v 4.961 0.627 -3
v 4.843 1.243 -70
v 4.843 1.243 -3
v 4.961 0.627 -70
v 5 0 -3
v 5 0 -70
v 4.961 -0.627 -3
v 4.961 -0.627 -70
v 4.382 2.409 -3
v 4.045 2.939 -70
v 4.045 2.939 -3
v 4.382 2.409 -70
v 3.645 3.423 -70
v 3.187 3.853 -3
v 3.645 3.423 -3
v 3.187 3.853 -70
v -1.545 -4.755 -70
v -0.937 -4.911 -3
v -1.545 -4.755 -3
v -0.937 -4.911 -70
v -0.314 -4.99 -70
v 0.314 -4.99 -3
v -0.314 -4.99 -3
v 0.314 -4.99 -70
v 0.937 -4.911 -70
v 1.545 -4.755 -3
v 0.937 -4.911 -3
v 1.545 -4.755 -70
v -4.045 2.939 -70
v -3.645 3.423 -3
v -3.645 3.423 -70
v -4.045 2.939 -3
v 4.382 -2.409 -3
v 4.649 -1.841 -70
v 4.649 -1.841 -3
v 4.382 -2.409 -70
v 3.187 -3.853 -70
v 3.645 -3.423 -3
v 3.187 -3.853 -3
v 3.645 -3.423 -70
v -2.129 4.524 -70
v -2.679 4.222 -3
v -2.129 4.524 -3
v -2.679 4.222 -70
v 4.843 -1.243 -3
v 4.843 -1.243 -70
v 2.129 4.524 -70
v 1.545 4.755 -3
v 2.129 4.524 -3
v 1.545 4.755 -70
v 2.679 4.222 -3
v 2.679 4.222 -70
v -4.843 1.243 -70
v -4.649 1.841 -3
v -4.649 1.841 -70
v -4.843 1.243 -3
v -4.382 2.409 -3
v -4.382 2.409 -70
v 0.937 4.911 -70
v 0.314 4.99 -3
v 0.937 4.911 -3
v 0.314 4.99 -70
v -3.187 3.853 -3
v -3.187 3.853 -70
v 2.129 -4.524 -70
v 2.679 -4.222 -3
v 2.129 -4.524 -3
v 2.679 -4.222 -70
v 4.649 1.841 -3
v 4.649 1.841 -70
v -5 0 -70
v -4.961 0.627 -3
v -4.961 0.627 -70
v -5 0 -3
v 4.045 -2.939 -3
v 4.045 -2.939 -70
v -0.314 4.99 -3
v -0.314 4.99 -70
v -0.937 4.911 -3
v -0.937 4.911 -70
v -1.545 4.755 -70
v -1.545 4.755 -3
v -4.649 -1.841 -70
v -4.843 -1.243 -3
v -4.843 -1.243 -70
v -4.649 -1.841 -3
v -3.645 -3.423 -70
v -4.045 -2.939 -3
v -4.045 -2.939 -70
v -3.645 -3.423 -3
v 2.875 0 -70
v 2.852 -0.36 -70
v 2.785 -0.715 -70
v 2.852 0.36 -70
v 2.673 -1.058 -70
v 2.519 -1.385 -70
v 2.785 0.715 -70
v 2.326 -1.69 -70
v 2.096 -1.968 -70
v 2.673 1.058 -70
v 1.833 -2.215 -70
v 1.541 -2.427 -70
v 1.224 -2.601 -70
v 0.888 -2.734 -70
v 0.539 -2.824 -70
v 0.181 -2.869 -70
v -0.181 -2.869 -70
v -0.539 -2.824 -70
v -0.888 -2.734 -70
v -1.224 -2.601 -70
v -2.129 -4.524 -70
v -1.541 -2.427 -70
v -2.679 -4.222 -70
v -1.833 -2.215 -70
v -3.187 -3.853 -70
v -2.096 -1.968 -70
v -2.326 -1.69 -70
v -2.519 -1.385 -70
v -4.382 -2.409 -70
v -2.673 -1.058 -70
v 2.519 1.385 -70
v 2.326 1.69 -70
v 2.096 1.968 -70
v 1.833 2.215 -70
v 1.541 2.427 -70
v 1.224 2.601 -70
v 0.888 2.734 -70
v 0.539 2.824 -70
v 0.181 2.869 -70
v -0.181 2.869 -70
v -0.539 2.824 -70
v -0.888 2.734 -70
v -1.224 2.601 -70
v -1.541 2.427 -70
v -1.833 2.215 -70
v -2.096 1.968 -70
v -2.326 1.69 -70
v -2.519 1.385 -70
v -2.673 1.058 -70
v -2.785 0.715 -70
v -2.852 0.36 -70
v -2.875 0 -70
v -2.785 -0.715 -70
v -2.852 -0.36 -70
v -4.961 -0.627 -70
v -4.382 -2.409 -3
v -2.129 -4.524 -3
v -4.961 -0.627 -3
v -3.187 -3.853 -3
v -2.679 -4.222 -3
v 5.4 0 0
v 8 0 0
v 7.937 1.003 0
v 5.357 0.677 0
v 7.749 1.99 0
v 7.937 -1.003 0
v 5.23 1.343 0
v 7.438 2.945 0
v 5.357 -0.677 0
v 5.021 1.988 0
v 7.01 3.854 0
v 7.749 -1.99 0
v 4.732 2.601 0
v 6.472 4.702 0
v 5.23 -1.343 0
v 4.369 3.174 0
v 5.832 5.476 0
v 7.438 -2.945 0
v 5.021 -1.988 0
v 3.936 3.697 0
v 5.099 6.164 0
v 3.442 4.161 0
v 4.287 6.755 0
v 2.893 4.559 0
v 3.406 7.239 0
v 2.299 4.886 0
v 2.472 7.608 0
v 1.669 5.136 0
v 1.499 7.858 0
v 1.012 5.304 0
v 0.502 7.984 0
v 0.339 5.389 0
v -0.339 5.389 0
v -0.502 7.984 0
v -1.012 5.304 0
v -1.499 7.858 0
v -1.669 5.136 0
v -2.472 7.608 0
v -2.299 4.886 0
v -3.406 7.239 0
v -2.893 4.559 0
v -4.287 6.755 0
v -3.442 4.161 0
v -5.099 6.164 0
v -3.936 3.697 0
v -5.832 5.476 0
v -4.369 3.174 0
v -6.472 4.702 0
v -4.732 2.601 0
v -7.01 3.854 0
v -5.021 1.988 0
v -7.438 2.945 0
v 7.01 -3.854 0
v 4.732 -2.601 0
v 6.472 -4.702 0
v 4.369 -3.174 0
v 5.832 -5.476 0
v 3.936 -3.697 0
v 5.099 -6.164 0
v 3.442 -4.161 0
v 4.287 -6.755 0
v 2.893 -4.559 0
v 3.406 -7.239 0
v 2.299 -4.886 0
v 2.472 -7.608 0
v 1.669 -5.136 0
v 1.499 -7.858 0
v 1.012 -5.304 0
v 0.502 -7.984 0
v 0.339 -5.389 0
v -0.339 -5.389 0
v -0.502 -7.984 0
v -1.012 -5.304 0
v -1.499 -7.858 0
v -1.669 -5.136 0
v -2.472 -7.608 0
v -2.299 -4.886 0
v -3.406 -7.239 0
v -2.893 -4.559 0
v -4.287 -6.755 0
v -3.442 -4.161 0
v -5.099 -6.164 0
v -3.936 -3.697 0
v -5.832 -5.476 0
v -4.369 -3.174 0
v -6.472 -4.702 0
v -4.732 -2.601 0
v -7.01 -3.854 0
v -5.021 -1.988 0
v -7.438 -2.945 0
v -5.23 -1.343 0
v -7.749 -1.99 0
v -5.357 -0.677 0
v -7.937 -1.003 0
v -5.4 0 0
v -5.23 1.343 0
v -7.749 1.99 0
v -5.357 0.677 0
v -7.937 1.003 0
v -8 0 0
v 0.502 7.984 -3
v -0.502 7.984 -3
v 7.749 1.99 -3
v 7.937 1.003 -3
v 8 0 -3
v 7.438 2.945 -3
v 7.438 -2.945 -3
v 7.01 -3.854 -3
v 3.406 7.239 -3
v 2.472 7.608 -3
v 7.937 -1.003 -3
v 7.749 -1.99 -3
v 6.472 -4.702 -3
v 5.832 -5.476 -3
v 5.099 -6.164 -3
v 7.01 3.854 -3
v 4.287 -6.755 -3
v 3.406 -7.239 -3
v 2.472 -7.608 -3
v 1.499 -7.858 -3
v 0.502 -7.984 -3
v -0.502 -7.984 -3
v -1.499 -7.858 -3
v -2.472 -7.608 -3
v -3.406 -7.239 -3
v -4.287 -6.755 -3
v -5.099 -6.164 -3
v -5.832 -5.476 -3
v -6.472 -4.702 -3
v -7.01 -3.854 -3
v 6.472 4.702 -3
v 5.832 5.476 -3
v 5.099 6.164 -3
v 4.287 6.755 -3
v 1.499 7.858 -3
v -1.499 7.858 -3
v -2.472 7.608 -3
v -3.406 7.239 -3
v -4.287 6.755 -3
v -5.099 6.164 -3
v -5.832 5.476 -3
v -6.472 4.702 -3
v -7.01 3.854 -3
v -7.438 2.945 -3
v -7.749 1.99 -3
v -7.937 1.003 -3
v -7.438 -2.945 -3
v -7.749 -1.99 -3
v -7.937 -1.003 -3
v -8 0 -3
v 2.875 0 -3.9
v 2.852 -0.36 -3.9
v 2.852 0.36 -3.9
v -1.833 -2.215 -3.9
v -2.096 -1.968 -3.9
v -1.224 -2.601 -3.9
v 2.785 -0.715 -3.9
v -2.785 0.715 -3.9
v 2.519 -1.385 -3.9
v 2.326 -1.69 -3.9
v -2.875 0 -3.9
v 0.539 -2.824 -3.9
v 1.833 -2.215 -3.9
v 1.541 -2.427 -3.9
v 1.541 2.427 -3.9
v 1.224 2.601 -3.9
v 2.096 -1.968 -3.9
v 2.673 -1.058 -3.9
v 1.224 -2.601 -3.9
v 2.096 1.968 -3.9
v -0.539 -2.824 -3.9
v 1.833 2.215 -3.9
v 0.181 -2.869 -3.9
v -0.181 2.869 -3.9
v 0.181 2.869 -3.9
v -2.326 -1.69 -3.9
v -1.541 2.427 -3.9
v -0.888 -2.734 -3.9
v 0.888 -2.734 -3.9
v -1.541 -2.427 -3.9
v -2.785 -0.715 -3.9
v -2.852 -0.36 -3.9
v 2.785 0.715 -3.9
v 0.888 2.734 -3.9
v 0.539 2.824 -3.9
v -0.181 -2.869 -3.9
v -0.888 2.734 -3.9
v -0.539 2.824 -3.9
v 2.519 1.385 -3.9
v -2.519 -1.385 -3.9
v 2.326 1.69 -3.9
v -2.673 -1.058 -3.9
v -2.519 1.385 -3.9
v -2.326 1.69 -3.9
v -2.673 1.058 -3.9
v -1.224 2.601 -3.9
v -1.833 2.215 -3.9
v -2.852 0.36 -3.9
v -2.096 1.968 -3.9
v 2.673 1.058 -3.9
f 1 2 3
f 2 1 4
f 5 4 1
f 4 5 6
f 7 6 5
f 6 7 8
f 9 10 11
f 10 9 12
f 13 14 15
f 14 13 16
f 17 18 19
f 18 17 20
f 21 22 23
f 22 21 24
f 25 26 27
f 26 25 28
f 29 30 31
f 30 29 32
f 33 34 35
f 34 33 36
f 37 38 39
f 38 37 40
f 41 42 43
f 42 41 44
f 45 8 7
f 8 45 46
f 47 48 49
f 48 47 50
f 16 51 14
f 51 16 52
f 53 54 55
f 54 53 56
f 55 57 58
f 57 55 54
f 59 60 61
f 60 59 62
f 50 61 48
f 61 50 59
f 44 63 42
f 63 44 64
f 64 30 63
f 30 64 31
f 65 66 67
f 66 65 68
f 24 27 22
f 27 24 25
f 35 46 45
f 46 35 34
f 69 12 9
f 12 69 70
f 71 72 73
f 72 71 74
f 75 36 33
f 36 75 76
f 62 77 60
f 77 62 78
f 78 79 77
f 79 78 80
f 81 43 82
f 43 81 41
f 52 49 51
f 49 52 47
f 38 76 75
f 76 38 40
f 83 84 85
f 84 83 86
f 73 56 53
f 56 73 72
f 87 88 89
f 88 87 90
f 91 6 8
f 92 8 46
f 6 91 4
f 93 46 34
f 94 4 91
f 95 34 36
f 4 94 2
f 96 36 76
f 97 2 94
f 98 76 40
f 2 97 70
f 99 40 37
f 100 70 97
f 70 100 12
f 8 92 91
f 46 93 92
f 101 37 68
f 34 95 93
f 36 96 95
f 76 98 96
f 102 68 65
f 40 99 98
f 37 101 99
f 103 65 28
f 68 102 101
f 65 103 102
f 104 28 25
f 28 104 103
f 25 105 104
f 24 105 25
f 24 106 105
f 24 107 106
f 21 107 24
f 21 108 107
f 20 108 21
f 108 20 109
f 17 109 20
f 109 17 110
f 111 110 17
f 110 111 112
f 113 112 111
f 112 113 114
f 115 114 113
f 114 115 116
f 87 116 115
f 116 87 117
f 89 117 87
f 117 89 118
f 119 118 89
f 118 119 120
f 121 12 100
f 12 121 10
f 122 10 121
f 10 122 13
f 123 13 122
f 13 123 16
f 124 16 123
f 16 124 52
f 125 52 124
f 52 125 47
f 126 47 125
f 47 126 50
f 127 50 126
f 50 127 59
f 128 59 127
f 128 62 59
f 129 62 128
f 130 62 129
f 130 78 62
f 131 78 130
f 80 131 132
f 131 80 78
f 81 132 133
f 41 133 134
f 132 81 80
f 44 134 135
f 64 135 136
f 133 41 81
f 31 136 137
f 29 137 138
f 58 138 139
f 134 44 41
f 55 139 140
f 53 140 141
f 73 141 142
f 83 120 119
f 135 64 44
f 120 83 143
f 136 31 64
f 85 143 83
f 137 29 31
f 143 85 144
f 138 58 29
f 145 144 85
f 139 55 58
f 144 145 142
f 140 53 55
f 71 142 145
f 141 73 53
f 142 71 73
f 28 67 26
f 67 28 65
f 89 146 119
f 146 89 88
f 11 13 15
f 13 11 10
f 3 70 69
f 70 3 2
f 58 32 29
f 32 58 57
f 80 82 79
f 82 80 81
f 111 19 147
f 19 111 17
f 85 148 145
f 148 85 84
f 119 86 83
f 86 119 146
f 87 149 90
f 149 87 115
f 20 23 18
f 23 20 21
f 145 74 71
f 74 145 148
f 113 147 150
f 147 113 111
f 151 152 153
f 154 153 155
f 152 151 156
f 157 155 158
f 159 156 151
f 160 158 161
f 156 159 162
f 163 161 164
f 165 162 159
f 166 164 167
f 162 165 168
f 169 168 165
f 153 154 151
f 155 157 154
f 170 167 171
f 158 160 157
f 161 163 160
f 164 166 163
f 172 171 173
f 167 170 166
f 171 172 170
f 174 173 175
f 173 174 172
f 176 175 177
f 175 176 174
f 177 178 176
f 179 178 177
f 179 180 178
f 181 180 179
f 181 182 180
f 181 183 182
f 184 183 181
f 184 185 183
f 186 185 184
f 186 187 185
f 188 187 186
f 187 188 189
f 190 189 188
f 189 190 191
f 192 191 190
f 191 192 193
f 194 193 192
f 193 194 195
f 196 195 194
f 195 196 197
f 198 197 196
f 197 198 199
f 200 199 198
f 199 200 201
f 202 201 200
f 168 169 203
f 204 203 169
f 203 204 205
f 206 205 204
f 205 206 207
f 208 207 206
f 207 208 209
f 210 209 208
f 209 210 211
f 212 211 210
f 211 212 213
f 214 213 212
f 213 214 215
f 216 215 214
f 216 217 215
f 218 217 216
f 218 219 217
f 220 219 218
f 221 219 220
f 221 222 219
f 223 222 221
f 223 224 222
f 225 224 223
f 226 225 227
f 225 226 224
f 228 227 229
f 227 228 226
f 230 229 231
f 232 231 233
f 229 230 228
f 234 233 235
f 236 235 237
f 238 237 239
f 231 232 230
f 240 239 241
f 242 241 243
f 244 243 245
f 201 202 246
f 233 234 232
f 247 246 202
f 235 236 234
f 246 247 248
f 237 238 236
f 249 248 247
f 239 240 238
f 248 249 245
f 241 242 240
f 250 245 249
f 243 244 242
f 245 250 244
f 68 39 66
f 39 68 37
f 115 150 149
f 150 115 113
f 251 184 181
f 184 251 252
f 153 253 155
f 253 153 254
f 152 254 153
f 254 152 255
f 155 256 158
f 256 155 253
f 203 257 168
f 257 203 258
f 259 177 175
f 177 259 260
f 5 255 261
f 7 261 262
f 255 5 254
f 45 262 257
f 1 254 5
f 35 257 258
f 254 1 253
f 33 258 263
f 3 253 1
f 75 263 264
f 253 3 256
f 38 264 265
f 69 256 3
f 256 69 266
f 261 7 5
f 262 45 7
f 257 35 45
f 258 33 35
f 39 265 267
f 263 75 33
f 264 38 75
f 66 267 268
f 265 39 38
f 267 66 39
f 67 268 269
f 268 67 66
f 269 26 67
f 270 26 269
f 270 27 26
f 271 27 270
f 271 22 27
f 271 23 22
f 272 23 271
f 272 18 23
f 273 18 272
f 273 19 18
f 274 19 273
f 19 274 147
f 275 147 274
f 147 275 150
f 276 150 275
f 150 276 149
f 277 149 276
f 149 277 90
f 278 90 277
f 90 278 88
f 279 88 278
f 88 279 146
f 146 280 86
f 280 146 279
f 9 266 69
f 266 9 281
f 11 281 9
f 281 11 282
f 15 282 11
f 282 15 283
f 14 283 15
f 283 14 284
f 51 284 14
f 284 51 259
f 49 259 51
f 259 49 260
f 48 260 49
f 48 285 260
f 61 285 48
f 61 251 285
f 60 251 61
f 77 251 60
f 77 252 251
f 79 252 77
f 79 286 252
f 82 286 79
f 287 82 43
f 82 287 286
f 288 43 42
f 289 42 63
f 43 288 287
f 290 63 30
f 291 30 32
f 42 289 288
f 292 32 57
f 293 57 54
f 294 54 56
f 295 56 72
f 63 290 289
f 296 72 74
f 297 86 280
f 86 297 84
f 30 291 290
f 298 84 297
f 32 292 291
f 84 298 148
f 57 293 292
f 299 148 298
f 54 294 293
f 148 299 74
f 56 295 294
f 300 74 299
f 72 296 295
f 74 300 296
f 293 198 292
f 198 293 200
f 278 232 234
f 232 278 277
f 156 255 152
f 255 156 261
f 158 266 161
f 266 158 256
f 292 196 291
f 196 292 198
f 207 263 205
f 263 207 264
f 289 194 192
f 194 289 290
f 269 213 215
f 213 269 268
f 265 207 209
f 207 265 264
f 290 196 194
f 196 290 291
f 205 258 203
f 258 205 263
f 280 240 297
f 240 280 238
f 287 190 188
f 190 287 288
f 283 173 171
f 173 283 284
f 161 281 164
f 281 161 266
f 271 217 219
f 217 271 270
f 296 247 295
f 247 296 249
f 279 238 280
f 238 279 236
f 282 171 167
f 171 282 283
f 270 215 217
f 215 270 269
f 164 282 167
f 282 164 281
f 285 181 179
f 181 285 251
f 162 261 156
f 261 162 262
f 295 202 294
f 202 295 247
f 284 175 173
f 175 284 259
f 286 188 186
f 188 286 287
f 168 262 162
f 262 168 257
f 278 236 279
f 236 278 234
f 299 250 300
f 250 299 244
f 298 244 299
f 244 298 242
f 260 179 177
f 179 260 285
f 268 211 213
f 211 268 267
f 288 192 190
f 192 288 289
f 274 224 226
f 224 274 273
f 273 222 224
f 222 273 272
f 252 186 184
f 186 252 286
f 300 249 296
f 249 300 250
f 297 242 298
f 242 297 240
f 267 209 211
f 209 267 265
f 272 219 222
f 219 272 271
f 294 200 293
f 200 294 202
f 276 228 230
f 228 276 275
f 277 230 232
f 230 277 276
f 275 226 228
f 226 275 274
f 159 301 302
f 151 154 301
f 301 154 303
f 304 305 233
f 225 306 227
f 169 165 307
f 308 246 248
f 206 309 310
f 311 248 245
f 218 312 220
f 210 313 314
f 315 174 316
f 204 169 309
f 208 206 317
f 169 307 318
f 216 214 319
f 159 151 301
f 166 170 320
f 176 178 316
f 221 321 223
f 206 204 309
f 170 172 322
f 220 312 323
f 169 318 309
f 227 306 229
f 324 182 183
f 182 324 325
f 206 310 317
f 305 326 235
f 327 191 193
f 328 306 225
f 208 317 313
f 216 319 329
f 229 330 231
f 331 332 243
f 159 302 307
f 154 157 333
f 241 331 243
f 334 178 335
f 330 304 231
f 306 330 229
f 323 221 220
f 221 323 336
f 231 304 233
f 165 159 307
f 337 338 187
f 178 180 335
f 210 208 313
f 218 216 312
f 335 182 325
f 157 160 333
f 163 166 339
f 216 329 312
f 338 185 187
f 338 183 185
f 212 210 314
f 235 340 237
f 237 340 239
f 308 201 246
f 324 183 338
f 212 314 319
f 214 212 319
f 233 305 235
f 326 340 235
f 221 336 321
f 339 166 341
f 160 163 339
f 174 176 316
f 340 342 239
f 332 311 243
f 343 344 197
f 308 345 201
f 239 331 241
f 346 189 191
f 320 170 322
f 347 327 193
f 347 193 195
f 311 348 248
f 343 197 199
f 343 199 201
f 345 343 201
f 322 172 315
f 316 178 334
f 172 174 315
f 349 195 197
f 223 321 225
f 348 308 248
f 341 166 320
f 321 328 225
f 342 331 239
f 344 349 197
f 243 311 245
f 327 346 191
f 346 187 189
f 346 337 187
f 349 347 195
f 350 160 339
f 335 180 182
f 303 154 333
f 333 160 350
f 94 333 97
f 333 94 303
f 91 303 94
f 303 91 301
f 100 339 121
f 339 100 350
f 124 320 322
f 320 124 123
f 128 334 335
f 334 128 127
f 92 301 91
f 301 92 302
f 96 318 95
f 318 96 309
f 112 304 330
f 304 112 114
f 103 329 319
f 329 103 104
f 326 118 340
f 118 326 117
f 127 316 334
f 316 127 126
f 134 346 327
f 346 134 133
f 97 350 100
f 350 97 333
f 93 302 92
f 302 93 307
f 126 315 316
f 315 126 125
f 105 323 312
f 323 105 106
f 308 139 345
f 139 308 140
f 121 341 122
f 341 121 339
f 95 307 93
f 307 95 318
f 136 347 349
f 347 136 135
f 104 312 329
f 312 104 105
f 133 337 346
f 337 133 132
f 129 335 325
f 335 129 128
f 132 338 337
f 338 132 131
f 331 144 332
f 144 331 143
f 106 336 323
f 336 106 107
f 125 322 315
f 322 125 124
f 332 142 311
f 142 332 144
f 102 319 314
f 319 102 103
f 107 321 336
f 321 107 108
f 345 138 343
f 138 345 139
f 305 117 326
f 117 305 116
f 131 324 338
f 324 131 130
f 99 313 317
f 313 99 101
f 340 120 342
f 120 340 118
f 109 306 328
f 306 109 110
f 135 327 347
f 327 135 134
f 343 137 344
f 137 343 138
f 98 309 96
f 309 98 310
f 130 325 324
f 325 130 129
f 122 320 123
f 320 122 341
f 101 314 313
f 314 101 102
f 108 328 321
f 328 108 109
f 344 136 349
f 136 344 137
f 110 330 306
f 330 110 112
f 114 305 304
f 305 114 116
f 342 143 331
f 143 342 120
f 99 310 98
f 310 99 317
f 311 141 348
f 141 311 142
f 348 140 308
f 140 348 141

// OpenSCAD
$fn = 50;


difference() {
	union() {
		translate(v = [0, 0, -70.0000000000]) {
			cylinder(h = 70, r = 5.0000000000);
		}
		translate(v = [0, 0, -3.0000000000]) {
			cylinder(h = 3, r = 8.0000000000);
		}
	}
	union() {
		translate(v = [0, 0, 0]) {
			rotate(a = [0, 0, 0]) {
				difference() {
					union() {
						#translate(v = [0, 0, -70.0000000000]) {
							cylinder(h = 70, r = 2.6000000000);
						}
						#translate(v = [0, 0, -3.9000000000]) {
							cylinder(h = 3.9000000000, r1 = 2.8750000000, r2 = 5.4000000000);
						}
						#translate(v = [0, 0, -70.0000000000]) {
							cylinder(h = 70, r = 2.8750000000);
						}
						#translate(v = [0, 0, -70.0000000000]) {
							cylinder(h = 70, r = 2.6000000000);
						}
					}
					union();
				}
			}
		}
	}
}
